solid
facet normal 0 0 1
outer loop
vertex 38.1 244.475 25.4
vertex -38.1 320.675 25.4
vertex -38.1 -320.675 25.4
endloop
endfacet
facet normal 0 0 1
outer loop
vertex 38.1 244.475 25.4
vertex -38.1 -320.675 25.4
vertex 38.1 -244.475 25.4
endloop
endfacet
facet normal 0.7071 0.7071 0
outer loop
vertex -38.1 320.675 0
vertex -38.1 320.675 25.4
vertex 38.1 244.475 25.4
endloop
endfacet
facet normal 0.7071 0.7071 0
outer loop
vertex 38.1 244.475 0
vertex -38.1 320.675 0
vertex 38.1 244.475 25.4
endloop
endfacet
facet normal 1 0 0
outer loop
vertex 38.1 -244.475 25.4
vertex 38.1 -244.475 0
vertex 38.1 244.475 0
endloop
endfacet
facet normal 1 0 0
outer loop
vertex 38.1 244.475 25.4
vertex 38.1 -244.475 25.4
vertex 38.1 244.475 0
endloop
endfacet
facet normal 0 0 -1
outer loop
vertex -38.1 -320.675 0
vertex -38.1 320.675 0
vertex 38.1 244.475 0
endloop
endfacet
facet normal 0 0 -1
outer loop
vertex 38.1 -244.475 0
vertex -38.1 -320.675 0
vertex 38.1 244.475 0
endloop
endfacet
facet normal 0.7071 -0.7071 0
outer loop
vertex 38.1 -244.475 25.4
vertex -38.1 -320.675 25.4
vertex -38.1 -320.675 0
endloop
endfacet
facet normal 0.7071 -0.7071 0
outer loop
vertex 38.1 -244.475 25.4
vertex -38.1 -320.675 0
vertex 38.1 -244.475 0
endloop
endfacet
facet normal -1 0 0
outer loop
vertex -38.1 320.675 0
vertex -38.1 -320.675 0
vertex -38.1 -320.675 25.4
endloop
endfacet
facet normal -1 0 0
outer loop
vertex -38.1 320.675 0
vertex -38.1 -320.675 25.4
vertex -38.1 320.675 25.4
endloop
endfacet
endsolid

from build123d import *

# Parameters (mm, degrees)
SKETCH1_W           = 76.2
SKETCH1_H           = 641.35
BOSS_EXTRUDE1_DEPTH = 25.4
CUT_EXTRUDE1_DEPTH  = 25.4
CUT_EXTRUDE2_DEPTH  = 25.4


with BuildPart() as part:
    # Sketch1 → Boss-Extrude1 (new body)
    with BuildSketch(Plane.XY):
        Rectangle(SKETCH1_W, SKETCH1_H)
    extrude(amount=BOSS_EXTRUDE1_DEPTH)

    # Sketch2 → Cut-Extrude1 (cut)
    with BuildSketch(Plane.XY.offset(25.4)):
        Polygon((-38.1, -320.675), (38.1, -244.475), (38.1, -320.675), align=None)
    extrude(amount=-CUT_EXTRUDE1_DEPTH, mode=Mode.SUBTRACT)

    # Sketch3 → Cut-Extrude2 (cut)
    with BuildSketch(Plane.XY.offset(25.4)):
        Polygon((-38.1, 320.675), (38.1, 244.475), (38.1, 320.675), align=None)
    extrude(amount=-CUT_EXTRUDE2_DEPTH, mode=Mode.SUBTRACT)


solid = part.part
